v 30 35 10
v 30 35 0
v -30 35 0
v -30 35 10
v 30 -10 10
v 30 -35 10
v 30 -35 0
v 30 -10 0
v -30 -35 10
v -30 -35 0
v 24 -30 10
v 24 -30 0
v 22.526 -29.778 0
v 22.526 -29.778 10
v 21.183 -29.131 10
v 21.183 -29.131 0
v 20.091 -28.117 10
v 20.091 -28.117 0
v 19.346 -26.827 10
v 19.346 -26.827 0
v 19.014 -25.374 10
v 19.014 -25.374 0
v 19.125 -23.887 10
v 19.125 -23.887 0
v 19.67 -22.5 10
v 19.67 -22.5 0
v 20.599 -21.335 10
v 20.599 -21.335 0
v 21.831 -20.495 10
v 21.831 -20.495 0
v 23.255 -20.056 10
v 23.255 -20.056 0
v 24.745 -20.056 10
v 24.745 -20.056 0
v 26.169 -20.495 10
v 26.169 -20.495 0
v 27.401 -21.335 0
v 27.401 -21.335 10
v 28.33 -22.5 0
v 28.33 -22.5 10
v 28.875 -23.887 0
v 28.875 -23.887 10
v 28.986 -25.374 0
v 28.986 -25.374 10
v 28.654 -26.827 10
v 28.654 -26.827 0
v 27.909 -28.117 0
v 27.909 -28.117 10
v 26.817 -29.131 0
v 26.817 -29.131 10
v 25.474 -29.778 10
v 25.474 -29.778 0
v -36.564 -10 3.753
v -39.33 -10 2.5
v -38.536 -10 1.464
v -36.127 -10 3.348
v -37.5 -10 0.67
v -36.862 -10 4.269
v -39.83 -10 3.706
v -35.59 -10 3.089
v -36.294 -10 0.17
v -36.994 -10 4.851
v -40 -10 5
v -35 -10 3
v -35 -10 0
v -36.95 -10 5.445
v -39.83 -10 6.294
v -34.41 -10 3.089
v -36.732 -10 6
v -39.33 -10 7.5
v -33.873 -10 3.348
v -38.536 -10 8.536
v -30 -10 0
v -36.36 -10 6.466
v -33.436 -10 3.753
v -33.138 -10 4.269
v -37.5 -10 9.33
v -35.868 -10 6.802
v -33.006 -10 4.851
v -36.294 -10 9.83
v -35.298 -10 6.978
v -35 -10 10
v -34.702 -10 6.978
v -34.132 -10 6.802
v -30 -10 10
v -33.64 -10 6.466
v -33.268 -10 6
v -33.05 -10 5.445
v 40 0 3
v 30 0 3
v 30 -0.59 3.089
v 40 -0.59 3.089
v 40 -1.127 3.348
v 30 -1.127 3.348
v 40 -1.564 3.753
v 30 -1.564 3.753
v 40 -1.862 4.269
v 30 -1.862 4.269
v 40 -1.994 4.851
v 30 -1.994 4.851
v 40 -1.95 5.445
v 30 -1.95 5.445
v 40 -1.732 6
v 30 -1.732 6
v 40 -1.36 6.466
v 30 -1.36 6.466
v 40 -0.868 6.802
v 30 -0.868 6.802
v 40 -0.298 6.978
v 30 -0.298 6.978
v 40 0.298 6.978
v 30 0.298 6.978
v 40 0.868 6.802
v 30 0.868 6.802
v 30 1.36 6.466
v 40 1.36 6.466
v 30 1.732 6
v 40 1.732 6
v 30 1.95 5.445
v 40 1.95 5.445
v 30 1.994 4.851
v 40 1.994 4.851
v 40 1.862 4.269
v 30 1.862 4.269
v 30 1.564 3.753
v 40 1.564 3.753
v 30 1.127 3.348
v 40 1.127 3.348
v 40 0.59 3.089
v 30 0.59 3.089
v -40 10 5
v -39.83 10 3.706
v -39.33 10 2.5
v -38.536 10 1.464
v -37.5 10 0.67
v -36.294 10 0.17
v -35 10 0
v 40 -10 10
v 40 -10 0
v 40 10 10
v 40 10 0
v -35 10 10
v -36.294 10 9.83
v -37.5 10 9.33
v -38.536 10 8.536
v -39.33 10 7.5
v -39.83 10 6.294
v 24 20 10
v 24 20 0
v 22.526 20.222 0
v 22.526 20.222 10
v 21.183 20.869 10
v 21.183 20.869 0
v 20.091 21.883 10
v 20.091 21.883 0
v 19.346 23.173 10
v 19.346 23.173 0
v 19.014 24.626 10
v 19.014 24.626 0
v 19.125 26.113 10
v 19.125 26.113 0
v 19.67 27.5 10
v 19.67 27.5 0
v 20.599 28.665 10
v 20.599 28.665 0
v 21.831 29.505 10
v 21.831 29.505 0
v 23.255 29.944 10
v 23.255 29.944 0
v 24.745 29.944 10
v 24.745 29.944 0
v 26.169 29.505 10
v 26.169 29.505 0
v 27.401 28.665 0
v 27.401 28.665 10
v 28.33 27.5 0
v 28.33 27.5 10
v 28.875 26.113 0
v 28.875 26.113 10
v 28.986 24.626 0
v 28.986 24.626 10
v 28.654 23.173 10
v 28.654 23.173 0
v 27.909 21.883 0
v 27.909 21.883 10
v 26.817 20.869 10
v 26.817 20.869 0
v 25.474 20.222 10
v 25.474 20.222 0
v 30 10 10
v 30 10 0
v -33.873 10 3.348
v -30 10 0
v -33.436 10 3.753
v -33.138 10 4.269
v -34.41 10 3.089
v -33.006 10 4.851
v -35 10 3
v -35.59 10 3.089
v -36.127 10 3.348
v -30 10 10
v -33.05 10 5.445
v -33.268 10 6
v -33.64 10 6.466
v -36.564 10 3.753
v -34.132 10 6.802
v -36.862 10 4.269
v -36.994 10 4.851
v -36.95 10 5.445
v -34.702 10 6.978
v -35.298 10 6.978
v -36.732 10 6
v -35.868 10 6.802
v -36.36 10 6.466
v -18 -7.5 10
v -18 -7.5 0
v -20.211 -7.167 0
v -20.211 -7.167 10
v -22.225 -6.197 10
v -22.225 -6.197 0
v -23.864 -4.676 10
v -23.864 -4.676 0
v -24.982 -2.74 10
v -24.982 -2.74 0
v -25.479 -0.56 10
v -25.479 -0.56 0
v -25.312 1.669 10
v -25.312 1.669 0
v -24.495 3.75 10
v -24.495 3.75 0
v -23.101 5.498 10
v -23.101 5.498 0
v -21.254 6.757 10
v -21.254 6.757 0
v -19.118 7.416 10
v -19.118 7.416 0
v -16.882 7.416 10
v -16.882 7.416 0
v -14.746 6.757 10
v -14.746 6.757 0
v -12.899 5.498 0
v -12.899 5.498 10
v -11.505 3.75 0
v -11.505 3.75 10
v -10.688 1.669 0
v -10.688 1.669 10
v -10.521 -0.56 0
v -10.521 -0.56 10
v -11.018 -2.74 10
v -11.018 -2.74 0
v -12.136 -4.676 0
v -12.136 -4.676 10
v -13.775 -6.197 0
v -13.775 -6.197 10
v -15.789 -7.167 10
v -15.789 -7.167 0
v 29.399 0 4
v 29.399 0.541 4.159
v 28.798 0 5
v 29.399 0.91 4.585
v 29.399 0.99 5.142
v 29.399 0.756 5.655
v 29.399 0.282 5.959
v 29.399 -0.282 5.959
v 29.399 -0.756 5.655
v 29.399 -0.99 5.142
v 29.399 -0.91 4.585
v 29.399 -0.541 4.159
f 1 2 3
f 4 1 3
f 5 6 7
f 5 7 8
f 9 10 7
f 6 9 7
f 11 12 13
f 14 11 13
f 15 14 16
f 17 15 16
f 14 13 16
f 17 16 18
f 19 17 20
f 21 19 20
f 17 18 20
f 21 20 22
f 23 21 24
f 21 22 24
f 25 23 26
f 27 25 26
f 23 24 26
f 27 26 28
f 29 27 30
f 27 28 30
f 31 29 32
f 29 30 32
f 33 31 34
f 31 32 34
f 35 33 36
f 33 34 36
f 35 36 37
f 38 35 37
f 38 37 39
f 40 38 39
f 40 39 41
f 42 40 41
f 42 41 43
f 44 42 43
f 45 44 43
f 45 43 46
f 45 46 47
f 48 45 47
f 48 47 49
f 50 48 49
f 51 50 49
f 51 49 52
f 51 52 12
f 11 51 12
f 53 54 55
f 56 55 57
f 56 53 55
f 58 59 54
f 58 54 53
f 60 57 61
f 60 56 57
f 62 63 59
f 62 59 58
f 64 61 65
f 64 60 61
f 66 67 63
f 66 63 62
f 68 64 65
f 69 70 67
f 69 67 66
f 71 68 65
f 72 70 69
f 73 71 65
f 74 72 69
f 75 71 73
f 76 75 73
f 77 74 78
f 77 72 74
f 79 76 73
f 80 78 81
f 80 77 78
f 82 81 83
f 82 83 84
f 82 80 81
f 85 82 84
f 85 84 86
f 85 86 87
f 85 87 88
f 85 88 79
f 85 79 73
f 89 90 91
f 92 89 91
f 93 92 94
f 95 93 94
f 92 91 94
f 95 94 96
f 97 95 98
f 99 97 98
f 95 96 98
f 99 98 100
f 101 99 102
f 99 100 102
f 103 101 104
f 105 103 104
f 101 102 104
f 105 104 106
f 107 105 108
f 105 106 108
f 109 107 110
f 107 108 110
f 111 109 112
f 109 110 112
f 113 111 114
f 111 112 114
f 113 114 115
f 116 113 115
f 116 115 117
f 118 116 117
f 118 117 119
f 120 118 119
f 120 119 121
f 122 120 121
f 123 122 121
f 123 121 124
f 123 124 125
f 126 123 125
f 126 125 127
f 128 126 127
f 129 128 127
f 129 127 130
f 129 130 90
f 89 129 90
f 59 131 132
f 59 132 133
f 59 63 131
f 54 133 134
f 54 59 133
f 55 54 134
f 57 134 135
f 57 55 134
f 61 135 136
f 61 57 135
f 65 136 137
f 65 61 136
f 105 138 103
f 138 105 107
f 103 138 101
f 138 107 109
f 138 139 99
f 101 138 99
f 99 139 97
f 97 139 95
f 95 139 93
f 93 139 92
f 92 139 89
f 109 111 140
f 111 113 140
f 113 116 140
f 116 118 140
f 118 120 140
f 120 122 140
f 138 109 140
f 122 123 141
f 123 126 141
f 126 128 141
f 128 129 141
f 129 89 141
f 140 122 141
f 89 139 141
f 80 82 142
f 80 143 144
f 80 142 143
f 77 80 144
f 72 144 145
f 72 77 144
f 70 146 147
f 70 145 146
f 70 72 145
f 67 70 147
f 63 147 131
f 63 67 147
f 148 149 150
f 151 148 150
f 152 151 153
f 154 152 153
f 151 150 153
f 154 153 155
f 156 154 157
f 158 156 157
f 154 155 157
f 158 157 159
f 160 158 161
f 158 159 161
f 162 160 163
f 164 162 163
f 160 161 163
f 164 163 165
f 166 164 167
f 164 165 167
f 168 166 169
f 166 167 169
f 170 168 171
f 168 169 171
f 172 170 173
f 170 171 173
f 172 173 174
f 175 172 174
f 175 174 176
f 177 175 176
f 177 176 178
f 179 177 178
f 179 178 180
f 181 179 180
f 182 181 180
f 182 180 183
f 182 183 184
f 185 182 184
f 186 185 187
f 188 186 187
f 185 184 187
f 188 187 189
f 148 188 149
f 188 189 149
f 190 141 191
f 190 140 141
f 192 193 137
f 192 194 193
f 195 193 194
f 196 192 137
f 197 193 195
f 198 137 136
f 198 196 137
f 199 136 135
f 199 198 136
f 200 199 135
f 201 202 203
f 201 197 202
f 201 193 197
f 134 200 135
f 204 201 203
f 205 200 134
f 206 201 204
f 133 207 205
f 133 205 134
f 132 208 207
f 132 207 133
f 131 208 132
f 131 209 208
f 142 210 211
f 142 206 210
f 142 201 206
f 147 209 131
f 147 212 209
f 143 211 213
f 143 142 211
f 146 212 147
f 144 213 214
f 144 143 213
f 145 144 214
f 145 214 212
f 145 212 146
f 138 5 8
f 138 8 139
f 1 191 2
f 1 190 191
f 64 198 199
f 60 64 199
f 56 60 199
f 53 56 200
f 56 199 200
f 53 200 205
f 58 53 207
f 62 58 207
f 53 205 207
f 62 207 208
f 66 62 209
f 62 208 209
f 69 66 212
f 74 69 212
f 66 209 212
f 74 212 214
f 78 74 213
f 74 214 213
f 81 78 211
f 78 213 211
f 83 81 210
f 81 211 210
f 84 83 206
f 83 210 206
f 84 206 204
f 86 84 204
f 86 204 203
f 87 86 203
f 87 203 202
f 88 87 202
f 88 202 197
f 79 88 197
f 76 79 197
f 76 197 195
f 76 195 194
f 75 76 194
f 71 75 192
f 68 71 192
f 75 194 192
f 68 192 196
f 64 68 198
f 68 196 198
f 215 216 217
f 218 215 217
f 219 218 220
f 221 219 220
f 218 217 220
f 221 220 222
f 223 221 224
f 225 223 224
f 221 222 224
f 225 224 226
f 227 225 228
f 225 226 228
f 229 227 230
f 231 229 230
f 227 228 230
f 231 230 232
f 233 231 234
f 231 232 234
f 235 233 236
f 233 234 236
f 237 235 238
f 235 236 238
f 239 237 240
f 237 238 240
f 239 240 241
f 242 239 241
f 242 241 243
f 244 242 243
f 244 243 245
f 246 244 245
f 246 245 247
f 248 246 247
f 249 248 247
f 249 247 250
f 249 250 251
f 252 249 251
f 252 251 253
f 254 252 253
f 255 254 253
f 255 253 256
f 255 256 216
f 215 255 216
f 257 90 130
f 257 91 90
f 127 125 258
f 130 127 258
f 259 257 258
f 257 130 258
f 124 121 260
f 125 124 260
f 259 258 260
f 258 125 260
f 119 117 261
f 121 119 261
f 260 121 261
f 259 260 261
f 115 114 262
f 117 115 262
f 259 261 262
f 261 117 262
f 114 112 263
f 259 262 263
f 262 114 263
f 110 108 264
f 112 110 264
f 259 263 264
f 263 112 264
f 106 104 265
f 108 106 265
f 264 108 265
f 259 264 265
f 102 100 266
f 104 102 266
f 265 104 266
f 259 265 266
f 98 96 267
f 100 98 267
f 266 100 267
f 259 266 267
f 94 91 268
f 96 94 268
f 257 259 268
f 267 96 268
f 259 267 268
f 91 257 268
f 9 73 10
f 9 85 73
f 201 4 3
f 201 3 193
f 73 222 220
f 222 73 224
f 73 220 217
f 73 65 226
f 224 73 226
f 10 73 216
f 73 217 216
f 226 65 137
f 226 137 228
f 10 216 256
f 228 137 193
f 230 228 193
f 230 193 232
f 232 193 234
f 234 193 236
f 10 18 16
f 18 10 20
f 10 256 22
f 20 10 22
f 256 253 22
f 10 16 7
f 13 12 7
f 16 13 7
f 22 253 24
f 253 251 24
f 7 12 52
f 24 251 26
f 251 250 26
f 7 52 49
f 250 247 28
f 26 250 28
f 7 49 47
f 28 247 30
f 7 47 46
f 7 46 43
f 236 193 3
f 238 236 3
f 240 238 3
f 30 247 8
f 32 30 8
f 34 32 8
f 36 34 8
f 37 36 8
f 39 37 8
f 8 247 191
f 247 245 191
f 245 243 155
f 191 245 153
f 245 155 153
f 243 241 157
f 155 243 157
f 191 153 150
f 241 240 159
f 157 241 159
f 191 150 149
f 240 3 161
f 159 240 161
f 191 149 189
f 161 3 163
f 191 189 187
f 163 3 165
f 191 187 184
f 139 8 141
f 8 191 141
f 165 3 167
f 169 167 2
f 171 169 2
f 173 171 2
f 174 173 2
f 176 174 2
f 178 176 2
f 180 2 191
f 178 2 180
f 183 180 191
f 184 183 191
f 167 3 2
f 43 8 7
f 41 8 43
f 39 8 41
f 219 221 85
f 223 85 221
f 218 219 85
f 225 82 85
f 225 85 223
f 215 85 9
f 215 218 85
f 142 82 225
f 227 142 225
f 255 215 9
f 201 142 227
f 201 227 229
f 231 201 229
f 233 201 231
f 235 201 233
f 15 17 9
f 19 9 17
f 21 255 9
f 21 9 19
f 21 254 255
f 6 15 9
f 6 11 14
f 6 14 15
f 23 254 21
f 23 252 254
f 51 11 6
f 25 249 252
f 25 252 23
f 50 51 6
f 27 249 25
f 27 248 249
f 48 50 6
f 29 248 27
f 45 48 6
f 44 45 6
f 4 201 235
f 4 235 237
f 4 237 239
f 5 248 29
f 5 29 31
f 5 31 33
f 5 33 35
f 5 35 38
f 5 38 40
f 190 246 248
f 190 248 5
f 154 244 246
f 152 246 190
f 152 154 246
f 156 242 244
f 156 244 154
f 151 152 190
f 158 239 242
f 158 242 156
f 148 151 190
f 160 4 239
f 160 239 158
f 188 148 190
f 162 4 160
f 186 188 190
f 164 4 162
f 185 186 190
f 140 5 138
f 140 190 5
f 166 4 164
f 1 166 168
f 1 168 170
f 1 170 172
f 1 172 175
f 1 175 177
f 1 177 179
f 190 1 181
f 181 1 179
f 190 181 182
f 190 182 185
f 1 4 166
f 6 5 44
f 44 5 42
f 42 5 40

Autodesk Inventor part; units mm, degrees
ref_plane "YZ Plane" through (0, 0, 0) normal (1, 0, 0) x (0, 1, 0)
ref_plane "XZ Plane" through (0, 0, 0) normal (0, 1, 0) x (-1, 0, 0)
ref_plane "XY Plane" through (0, 0, 0) normal (0, 0, 1) x (1, 0, 0)
sketch "Skizze1" plane through (0, 0, 0) normal (0, 0, 1) x (1, 0, 0)
  line L0 (-40, -35) -> (40, -35)
  line L1 (40, -35) -> (40, 35)
  line L2 (40, 35) -> (-40, 35)
  line L3 (-40, 35) -> (-40, -35)
  line L4 (-40, -35) -> (40, 35) construction
  line L5 (40, -35) -> (-40, 35) construction
  point P0 (0, 0)
  dimension "d0" = 80
  dimension "d1" = 70
extrude "Extrusion1" add sketch "Skizze1" along normal blind 10
sketch "Skizze2" plane through (0, 0, 10) normal (0, 0, 1) x (1, 0, 0)
  line L0 (-40, 35) -> (-30, 35)
  line L1 (-30, 35) -> (-30, 10)
  line L2 (-30, 10) -> (-40, 10)
  line L3 (-40, 10) -> (-40, 35)
  line L4 (-40, 35) -> (-40, -35) projected
  line L5 (-30, -35) -> (-40, -35)
  line L6 (-40, -35) -> (-40, -10)
  line L7 (-40, -10) -> (-30, -10)
  line L8 (-30, -10) -> (-30, -35)
  line L9 (40, 35) -> (-40, 35) projected
  line L10 (40, -35) -> (40, 35) projected
  line L11 (30, 35) -> (40, 35)
  line L12 (40, 35) -> (40, 10)
  line L13 (40, 10) -> (30, 10)
  line L14 (30, 10) -> (30, 35)
  line L15 (30, -10) -> (40, -10)
  line L16 (40, -10) -> (40, -35)
  line L17 (40, -35) -> (30, -35)
  line L18 (30, -35) -> (30, -10)
  point P0 (0, 0)
  dimension "d4" = 10
  dimension "d5" = 10
  dimension "d6" = 20
  dimension "d7" = 20
  dimension "d8" = 25
  dimension "d9" = 25
extrude "Extrusion2" cut sketch "Skizze2" against normal blind 10
sketch "Skizze3" plane through (0, 0, 10) normal (0, 0, 1) x (1, 0, 0)
  line L0 (-30, -35) -> (30, -35) projected
  line L1 (-30, 10) -> (-40, 10) projected
  line L2 (40, -10) -> (40, 10) projected
  line L3 (30, -35) -> (30, -10) projected
  point P0 (0, 0)
  point P1 (24, 25)
  point P2 (24, -25)
  dimension "d12" = 10
  dimension "d13" = 50
  dimension "d17" = 16
hole "Bohrung1" at (24, 25, 10) at (24, -25, 10) direction (0, 0, -1) diameter 10 end through all
sketch "Skizze4" plane through (0, 0, 10) normal (0, 0, 1) x (1, 0, 0)
  line L0 (40, -10) -> (40, 10) projected
  line L1 (-30, 10) -> (-40, 10) projected
  point P0 (0, 0)
  point P1 (-18, 0)
  dimension "d25" = 58
  dimension "d26" = 10
hole "Bohrung2" at (-18, 0, 10) direction (0, 0, -1) diameter 15 end through all
sketch "Skizze5" plane through (-40, -10, 10) normal (0, -1, 0) x (1, 0, 0)
  line L0 (0, 0) -> (10, 0) projected
  line L1 (10, 0) -> (10, -10) projected
  point P0 (40, -10)
  point P1 (5, -5)
  dimension "d34" = 5
  dimension "d35" = 5
hole "Bohrung3" at (-35, -10, 5) direction (0, 1, 0) diameter 4 end through all
sketch "Skizze6" plane through (40, -10, 0) normal (1, 0, 0) x (0, 0, -1)
  line L0 (0, 20) -> (-10, 20) projected
  line L1 (0, 0) -> (0, 20) projected
  point P0 (0, 10)
  point P1 (-5, 10)
  dimension "d43" = 10
  dimension "d44" = 5
hole "Bohrung4" at (40, 0, 5) direction (-1, 0, 0) diameter 4 depth 10 tip angle 118
fillet "Rundung1" radius 5 2 edges at (-40, 0, 0) (-40, 0, 10)
properties part number "ABI_Deckel"
